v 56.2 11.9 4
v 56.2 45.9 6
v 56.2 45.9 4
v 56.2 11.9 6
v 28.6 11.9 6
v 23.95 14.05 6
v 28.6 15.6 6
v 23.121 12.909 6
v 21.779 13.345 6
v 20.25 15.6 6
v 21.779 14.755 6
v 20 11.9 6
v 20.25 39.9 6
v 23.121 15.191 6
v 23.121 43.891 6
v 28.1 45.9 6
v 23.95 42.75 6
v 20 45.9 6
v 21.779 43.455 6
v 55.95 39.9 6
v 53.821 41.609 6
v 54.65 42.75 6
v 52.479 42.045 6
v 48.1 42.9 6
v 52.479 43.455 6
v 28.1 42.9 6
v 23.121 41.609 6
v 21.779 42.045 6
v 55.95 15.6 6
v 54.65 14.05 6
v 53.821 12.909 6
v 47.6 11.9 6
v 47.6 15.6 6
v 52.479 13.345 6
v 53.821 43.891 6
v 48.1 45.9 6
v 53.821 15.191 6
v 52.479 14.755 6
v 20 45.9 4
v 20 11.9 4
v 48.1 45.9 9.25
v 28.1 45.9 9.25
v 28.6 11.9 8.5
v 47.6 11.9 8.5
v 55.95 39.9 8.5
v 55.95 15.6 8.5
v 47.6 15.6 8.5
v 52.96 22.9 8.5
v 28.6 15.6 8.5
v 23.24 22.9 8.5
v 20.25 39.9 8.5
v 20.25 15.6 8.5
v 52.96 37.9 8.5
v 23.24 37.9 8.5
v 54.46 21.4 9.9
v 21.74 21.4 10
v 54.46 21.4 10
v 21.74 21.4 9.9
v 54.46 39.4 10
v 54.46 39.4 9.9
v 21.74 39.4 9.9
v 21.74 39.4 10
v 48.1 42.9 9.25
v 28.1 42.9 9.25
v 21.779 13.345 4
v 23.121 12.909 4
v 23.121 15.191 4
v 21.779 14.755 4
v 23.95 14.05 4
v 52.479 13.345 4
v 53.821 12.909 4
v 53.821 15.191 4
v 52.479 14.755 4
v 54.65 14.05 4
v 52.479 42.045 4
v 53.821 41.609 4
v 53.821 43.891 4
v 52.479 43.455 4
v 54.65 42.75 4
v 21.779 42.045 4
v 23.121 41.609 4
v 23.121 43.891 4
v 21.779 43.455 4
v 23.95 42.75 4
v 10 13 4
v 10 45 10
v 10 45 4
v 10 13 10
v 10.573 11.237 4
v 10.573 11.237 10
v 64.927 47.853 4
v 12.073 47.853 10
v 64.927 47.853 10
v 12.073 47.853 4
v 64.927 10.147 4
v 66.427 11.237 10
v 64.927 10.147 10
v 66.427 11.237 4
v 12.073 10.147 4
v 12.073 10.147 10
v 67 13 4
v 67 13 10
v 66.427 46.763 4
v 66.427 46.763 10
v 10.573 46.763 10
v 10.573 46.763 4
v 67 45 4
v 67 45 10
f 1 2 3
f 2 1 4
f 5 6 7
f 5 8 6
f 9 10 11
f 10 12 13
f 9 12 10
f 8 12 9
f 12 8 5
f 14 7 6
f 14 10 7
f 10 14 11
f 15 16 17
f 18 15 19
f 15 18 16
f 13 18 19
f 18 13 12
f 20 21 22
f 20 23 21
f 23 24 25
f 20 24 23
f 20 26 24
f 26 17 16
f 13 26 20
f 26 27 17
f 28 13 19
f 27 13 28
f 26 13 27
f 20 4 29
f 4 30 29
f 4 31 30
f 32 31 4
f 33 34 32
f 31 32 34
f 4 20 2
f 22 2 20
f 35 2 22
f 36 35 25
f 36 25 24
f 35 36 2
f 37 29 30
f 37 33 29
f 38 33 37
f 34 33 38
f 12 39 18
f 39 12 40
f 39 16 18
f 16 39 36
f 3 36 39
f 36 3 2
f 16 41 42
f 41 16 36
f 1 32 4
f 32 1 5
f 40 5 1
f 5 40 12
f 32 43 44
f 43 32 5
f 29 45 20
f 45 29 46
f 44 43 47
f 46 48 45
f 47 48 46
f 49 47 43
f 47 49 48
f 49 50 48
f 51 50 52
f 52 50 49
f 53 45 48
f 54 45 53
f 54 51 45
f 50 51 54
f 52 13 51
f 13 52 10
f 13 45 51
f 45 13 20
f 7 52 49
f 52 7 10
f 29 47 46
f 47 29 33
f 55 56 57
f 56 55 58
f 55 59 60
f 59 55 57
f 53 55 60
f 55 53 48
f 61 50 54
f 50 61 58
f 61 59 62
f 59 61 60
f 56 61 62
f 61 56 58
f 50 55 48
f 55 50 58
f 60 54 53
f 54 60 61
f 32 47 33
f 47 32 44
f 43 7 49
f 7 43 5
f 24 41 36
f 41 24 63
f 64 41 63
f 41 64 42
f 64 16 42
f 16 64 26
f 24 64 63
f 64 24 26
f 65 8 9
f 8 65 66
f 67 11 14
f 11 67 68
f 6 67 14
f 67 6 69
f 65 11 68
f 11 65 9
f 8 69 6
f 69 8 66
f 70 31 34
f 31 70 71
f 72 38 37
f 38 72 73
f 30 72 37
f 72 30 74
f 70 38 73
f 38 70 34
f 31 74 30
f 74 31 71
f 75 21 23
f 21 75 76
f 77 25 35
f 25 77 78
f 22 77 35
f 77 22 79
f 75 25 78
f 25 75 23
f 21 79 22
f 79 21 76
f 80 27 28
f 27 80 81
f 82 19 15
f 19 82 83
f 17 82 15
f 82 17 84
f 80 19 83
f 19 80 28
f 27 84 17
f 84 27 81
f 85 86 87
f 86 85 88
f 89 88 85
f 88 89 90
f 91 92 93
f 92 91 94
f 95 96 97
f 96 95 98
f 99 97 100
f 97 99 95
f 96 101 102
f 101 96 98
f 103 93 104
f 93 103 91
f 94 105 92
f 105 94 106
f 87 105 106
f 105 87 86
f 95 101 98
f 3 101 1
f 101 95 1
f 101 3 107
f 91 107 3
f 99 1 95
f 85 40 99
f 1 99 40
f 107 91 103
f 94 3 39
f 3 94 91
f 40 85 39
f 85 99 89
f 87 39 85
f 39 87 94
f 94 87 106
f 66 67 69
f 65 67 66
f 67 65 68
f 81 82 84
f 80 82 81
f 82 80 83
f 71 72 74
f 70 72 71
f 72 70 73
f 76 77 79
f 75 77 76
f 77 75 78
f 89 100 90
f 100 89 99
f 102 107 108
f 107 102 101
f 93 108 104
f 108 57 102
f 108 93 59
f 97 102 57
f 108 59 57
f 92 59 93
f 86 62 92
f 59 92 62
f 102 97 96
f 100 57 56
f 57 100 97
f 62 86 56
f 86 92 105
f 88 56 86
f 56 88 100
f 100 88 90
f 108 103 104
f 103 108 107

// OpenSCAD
/*
 * OLED (SH1106) Holder
 * from: https://www.thingiverse.com/thing:4134190
 */

tollerance = .5;

baseplate_width = 100;
baseplate_height = 60;
baseplate_thickness = 4;
baseplate_oled_plate_offset_x = 10;
baseplate_oled_plate_offset_y = 10;

// OLED PCB
oled_tollerance = 0.3;
oled_pcb_height = 33.7 + oled_tollerance; 
oled_pcb_width = 35.9 + oled_tollerance; // 35.5 according to spec

oled_pcb_hole_dia = 2.1 + oled_tollerance;

oled_pcb_hole_dist_x = 30.7; // 30.4 spec
oled_pcb_hole_dist_y = 28.7; // 28.5
oled_pcb_hole_offset_bottom = 2 + (oled_tollerance / 2); // bottom is different somehow
//oled_pcb_hole_offset_left = 3 + (oled_tollerance/2);

oled_pcb_hole_offset_left = (oled_pcb_width - oled_pcb_hole_dist_x) / 2; // 3 + (oled_tollerance/2); <-- new

// Display area
oled_display_height = 24 + oled_tollerance; // 23 accordong to spec
oled_display_width = 35.4 + oled_tollerance;
oled_display_thick = 2.2 + oled_tollerance;
oled_display_offset_bottom = (oled_pcb_height - oled_display_height) - 6; // 5.25 according to spec
// Active area
oled_display_active_width = 29.42 + oled_tollerance;
oled_display_active_height = 14.7 + oled_tollerance;
oled_display_active_offset_bottom = oled_pcb_height - 8 - oled_display_active_height; // 7.35 to original spec
oled_chamfer = 3;

// OLED PLate
oled_plate_height = 40-2;
oled_plate_width = 50+7;
oled_plate_depth = 6;
oled_plate_knob_dia = 24;
oled_plate_rotary_dia = 8;

pcb_holder_walls = 1.5;

oled_pcb_thick = oled_plate_depth; //10 + oled_tollerance; // 10 for cleant cutour
oled_cutout_total_height = oled_pcb_thick + oled_display_thick + pcb_holder_walls;

extra = 0.00001;

module oled_plate(plate_cutout = false) {
    if (plate_cutout == false) {
        difference() {
            hull() {
                roundedcube(oled_plate_width,oled_plate_height,oled_plate_depth, 3);
            }
        // !!! oled_cutout() is the important function
        translate([10,(40 - oled_pcb_width) / 2,(oled_plate_depth - oled_cutout_total_height + extra )]) oled_cutout();
        }
    } else {
    translate([10 + (oled_pcb_width / 2) - 10 ,31,-baseplate_thickness]) cube([20,5,baseplate_thickness]); // OLED connector
    }
}

module oled_cutout() {
    difference() {
        union(){
            cube([oled_pcb_width,oled_pcb_height,oled_pcb_thick]); // PCB
            translate([(oled_pcb_width - oled_display_width) / 2,oled_display_offset_bottom ,oled_pcb_thick]) cube([oled_display_width,oled_display_height,oled_display_thick]); // Display
            hull() { // Display visable area
                translate([(oled_pcb_width - oled_display_active_width) / 2, oled_display_active_offset_bottom,oled_pcb_thick + oled_display_thick]) cube([oled_display_active_width,oled_display_active_height,.1]); 
                translate([(((oled_pcb_width - oled_display_active_width) / 2) - (oled_chamfer / 2)) , oled_display_active_offset_bottom - (oled_chamfer / 2), oled_pcb_thick + oled_display_thick + pcb_holder_walls - 0.1]) cube([oled_display_active_width + oled_chamfer ,oled_display_active_height + oled_chamfer, .1]);
                
            }
            // Flat cable cutout
            translate([(oled_pcb_width - 19) / 2,0, oled_pcb_thick]) cube([19,(oled_pcb_height - oled_display_height) / 2,oled_display_thick]);
            // Connector cutout
            translate([(oled_pcb_width - 20) / 2,oled_pcb_height - 3,oled_pcb_thick]) cube([20,3, oled_display_thick + (pcb_holder_walls / 2) ]);
        }
        // Holes
        translate([oled_pcb_hole_offset_left,oled_pcb_hole_offset_bottom ,0]) cylinder(h = oled_pcb_height, d = oled_pcb_hole_dia, center = false); // bottom left
        translate([oled_pcb_hole_offset_left + oled_pcb_hole_dist_x,oled_pcb_hole_offset_bottom,0]) cylinder(h = oled_pcb_height, d = oled_pcb_hole_dia, center = false); // bottom right
              translate([oled_pcb_hole_offset_left + oled_pcb_hole_dist_x,oled_pcb_hole_offset_bottom + oled_pcb_hole_dist_y,0]) cylinder(h = oled_pcb_height, d = oled_pcb_hole_dia, center = false); // top left
        translate([oled_pcb_hole_offset_left,oled_pcb_hole_offset_bottom + oled_pcb_hole_dist_y,0]) cylinder(h = oled_pcb_height, d = oled_pcb_hole_dia, center = false); // top right            
    }   
    
}

module mounting_hole() {
    difference() {
        cylinder(d = 5, h = baseplate_thickness);
        cylinder(d = 3, h = baseplate_thickness);
    }
}

module roundedcube(xdim ,ydim ,zdim,rdim){
hull(){
translate([rdim,rdim,0])cylinder(h=zdim,r=rdim);
translate([xdim-rdim,rdim,0])cylinder(h=zdim,r=rdim);

translate([rdim,ydim-rdim,0])cylinder(h=zdim,r=rdim);
translate([xdim-rdim,ydim-rdim,0])cylinder(h=zdim,r=rdim);
}
}

// Draw the oled plate
translate([baseplate_oled_plate_offset_x,baseplate_oled_plate_offset_y,baseplate_thickness]) oled_plate(plate_cutout = false);
